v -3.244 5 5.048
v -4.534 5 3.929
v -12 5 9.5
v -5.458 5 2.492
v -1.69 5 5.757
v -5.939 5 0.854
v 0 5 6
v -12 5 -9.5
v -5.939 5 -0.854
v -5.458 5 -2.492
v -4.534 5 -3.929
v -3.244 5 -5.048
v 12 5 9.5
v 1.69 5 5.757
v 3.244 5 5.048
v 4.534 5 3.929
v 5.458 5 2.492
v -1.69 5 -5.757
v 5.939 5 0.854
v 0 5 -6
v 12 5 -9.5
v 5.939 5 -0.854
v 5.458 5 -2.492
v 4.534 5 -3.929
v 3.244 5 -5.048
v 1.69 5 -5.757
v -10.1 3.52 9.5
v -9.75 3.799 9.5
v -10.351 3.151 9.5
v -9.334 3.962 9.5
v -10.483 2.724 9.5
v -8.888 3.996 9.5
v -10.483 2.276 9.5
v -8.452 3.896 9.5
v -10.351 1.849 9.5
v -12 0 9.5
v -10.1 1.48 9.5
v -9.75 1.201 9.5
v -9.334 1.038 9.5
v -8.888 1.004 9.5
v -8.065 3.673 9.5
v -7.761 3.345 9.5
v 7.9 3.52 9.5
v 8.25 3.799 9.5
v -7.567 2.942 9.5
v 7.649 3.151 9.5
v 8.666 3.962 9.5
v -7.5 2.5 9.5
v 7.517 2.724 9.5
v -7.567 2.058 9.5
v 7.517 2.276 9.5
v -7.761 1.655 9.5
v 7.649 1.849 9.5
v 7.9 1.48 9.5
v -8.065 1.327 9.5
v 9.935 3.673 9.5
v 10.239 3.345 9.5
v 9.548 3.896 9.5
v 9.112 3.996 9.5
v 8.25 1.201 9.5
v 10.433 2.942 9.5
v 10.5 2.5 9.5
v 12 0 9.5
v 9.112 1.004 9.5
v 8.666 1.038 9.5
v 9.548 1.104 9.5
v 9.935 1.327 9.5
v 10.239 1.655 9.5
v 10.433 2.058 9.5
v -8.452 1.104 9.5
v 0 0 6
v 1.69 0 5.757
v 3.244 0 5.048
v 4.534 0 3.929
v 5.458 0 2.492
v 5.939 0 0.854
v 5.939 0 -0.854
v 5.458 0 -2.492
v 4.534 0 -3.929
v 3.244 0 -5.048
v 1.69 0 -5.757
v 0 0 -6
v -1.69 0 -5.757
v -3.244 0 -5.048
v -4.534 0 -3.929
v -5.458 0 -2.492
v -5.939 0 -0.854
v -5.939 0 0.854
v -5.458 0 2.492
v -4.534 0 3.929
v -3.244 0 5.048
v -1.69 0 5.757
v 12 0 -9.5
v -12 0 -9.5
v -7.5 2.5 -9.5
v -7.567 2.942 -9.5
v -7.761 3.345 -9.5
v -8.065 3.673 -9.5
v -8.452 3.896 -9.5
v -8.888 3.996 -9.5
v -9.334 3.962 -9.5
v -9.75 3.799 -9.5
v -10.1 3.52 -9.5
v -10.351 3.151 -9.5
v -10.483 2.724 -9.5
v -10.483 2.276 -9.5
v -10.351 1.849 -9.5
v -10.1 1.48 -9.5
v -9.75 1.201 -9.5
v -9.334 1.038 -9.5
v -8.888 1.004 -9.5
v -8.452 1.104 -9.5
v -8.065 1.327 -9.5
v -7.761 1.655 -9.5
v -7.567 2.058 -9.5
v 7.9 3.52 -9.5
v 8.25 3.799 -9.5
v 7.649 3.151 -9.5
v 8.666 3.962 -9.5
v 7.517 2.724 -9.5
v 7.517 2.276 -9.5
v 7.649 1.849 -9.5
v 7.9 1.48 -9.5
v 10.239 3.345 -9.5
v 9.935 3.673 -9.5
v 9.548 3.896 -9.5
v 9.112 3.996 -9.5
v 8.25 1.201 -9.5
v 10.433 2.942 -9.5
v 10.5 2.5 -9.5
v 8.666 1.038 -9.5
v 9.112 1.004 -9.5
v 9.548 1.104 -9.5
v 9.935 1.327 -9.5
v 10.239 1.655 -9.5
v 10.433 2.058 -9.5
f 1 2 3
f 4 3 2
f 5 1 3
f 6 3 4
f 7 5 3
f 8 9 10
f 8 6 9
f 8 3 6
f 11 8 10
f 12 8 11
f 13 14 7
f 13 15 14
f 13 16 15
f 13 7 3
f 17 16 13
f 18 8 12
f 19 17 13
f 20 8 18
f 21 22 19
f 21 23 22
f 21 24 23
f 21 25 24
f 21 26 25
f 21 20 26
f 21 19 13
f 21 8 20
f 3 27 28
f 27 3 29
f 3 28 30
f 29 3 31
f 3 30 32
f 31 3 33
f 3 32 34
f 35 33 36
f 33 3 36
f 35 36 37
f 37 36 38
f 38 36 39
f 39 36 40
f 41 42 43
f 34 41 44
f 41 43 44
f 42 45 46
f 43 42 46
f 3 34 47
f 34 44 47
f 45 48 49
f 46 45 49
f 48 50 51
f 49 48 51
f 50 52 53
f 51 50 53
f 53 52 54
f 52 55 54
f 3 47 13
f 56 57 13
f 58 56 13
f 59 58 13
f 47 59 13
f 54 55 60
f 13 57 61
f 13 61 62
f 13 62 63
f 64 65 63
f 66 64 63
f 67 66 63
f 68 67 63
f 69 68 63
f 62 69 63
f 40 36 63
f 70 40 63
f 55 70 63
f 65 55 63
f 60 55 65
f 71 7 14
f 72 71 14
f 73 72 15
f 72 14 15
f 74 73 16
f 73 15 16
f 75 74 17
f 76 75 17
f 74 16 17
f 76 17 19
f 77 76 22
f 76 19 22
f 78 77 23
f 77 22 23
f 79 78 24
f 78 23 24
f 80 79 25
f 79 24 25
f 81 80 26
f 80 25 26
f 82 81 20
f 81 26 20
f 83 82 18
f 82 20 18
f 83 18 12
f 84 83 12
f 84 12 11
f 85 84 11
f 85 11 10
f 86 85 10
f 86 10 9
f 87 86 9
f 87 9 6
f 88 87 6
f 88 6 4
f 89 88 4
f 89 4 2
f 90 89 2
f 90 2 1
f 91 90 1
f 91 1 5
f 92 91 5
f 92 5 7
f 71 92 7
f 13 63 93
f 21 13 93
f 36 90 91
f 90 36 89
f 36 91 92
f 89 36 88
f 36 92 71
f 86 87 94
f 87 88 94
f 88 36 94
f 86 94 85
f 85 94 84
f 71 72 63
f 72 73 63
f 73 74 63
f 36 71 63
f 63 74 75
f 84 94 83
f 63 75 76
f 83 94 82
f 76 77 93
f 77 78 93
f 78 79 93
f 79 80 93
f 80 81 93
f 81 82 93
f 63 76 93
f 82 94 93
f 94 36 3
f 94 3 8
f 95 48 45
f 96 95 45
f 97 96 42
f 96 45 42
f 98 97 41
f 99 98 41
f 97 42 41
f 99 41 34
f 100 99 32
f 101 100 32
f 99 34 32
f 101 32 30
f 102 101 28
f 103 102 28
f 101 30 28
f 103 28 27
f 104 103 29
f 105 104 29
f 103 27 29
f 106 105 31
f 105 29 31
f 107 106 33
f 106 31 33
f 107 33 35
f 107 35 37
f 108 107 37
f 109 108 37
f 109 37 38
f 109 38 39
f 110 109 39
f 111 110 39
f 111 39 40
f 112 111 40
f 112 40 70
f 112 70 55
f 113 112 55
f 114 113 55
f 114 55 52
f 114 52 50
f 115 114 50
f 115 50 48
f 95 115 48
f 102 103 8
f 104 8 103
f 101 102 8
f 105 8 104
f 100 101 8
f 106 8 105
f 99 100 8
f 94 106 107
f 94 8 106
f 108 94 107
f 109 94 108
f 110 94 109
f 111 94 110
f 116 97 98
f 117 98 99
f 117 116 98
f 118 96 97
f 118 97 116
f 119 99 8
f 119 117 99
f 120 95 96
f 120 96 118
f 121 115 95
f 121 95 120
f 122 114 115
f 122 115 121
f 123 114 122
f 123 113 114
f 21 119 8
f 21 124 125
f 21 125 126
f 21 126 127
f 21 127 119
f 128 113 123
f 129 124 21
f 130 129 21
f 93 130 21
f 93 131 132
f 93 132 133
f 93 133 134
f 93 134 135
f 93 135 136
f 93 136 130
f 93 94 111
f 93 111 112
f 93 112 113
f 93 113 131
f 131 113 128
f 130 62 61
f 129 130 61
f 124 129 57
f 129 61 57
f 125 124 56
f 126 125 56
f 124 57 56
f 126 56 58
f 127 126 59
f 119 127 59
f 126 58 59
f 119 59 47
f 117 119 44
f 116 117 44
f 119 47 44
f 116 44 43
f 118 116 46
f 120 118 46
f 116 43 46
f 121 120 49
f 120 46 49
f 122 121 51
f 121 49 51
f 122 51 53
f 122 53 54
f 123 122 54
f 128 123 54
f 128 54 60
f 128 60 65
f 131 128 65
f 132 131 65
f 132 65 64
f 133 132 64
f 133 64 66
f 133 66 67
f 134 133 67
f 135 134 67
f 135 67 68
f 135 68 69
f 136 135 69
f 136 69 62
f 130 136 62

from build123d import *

# Parameters (mm, degrees)
SKETCH_1_W          = 24
SKETCH_1_H          = 19
EXTRUDE_1_DEPTH     = 5
CUT_EXTRUDE_1_REACH = 18.101
SKETCH_2_R          = 6
CUT_EXTRUDE_2_REACH = 25.022
SKETCH_3_R          = 1.5


with BuildPart() as part:
    # 草图1 → 凸台-拉伸1 (new body)
    with BuildSketch(Plane(origin=(0, 0, 0), x_dir=(1, 0, 0), z_dir=(0, 1, 0))):
        Rectangle(SKETCH_1_W, SKETCH_1_H)
    extrude(amount=EXTRUDE_1_DEPTH)

    # 草图2 → 切除-拉伸1 (cut, up to next)
    with BuildSketch(Plane(origin=(0, 5, 0), x_dir=(1, 0, 0), z_dir=(0, 1, 0)), mode=Mode.PRIVATE) as cut_extrude_1_sk1:
        with Locations(Location((0, 0, 0), (0, 0, 270))):
            Circle(SKETCH_2_R)
    cut_extrude_1_tool1 = extrude(cut_extrude_1_sk1.sketch, amount=-CUT_EXTRUDE_1_REACH, mode=Mode.PRIVATE) & part.part
    add(cut_extrude_1_tool1.solids().sort_by_distance((0, 5, 0))[0], mode=Mode.SUBTRACT)

    # 草图3 → 切除-拉伸2 (cut, up to next)
    with BuildSketch(Plane.XY.offset(9.5), mode=Mode.PRIVATE) as cut_extrude_2_sk1:
        with Locations((-9, 2.5)):
            Circle(SKETCH_3_R)
    cut_extrude_2_tool1 = extrude(cut_extrude_2_sk1.sketch, amount=-CUT_EXTRUDE_2_REACH, mode=Mode.PRIVATE) & part.part
    # 草图3 → 切除-拉伸2 (cut, up to next)
    with BuildSketch(Plane.XY.offset(9.5), mode=Mode.PRIVATE) as cut_extrude_2_sk2:
        with Locations((9, 2.5)):
            Circle(SKETCH_3_R)
    cut_extrude_2_tool2 = extrude(cut_extrude_2_sk2.sketch, amount=-CUT_EXTRUDE_2_REACH, mode=Mode.PRIVATE) & part.part
    add(cut_extrude_2_tool1.solids().sort_by_distance((-9, 2.5, 9.5))[0], mode=Mode.SUBTRACT)
    add(cut_extrude_2_tool2.solids().sort_by_distance((9, 2.5, 9.5))[0], mode=Mode.SUBTRACT)


solid = part.part
